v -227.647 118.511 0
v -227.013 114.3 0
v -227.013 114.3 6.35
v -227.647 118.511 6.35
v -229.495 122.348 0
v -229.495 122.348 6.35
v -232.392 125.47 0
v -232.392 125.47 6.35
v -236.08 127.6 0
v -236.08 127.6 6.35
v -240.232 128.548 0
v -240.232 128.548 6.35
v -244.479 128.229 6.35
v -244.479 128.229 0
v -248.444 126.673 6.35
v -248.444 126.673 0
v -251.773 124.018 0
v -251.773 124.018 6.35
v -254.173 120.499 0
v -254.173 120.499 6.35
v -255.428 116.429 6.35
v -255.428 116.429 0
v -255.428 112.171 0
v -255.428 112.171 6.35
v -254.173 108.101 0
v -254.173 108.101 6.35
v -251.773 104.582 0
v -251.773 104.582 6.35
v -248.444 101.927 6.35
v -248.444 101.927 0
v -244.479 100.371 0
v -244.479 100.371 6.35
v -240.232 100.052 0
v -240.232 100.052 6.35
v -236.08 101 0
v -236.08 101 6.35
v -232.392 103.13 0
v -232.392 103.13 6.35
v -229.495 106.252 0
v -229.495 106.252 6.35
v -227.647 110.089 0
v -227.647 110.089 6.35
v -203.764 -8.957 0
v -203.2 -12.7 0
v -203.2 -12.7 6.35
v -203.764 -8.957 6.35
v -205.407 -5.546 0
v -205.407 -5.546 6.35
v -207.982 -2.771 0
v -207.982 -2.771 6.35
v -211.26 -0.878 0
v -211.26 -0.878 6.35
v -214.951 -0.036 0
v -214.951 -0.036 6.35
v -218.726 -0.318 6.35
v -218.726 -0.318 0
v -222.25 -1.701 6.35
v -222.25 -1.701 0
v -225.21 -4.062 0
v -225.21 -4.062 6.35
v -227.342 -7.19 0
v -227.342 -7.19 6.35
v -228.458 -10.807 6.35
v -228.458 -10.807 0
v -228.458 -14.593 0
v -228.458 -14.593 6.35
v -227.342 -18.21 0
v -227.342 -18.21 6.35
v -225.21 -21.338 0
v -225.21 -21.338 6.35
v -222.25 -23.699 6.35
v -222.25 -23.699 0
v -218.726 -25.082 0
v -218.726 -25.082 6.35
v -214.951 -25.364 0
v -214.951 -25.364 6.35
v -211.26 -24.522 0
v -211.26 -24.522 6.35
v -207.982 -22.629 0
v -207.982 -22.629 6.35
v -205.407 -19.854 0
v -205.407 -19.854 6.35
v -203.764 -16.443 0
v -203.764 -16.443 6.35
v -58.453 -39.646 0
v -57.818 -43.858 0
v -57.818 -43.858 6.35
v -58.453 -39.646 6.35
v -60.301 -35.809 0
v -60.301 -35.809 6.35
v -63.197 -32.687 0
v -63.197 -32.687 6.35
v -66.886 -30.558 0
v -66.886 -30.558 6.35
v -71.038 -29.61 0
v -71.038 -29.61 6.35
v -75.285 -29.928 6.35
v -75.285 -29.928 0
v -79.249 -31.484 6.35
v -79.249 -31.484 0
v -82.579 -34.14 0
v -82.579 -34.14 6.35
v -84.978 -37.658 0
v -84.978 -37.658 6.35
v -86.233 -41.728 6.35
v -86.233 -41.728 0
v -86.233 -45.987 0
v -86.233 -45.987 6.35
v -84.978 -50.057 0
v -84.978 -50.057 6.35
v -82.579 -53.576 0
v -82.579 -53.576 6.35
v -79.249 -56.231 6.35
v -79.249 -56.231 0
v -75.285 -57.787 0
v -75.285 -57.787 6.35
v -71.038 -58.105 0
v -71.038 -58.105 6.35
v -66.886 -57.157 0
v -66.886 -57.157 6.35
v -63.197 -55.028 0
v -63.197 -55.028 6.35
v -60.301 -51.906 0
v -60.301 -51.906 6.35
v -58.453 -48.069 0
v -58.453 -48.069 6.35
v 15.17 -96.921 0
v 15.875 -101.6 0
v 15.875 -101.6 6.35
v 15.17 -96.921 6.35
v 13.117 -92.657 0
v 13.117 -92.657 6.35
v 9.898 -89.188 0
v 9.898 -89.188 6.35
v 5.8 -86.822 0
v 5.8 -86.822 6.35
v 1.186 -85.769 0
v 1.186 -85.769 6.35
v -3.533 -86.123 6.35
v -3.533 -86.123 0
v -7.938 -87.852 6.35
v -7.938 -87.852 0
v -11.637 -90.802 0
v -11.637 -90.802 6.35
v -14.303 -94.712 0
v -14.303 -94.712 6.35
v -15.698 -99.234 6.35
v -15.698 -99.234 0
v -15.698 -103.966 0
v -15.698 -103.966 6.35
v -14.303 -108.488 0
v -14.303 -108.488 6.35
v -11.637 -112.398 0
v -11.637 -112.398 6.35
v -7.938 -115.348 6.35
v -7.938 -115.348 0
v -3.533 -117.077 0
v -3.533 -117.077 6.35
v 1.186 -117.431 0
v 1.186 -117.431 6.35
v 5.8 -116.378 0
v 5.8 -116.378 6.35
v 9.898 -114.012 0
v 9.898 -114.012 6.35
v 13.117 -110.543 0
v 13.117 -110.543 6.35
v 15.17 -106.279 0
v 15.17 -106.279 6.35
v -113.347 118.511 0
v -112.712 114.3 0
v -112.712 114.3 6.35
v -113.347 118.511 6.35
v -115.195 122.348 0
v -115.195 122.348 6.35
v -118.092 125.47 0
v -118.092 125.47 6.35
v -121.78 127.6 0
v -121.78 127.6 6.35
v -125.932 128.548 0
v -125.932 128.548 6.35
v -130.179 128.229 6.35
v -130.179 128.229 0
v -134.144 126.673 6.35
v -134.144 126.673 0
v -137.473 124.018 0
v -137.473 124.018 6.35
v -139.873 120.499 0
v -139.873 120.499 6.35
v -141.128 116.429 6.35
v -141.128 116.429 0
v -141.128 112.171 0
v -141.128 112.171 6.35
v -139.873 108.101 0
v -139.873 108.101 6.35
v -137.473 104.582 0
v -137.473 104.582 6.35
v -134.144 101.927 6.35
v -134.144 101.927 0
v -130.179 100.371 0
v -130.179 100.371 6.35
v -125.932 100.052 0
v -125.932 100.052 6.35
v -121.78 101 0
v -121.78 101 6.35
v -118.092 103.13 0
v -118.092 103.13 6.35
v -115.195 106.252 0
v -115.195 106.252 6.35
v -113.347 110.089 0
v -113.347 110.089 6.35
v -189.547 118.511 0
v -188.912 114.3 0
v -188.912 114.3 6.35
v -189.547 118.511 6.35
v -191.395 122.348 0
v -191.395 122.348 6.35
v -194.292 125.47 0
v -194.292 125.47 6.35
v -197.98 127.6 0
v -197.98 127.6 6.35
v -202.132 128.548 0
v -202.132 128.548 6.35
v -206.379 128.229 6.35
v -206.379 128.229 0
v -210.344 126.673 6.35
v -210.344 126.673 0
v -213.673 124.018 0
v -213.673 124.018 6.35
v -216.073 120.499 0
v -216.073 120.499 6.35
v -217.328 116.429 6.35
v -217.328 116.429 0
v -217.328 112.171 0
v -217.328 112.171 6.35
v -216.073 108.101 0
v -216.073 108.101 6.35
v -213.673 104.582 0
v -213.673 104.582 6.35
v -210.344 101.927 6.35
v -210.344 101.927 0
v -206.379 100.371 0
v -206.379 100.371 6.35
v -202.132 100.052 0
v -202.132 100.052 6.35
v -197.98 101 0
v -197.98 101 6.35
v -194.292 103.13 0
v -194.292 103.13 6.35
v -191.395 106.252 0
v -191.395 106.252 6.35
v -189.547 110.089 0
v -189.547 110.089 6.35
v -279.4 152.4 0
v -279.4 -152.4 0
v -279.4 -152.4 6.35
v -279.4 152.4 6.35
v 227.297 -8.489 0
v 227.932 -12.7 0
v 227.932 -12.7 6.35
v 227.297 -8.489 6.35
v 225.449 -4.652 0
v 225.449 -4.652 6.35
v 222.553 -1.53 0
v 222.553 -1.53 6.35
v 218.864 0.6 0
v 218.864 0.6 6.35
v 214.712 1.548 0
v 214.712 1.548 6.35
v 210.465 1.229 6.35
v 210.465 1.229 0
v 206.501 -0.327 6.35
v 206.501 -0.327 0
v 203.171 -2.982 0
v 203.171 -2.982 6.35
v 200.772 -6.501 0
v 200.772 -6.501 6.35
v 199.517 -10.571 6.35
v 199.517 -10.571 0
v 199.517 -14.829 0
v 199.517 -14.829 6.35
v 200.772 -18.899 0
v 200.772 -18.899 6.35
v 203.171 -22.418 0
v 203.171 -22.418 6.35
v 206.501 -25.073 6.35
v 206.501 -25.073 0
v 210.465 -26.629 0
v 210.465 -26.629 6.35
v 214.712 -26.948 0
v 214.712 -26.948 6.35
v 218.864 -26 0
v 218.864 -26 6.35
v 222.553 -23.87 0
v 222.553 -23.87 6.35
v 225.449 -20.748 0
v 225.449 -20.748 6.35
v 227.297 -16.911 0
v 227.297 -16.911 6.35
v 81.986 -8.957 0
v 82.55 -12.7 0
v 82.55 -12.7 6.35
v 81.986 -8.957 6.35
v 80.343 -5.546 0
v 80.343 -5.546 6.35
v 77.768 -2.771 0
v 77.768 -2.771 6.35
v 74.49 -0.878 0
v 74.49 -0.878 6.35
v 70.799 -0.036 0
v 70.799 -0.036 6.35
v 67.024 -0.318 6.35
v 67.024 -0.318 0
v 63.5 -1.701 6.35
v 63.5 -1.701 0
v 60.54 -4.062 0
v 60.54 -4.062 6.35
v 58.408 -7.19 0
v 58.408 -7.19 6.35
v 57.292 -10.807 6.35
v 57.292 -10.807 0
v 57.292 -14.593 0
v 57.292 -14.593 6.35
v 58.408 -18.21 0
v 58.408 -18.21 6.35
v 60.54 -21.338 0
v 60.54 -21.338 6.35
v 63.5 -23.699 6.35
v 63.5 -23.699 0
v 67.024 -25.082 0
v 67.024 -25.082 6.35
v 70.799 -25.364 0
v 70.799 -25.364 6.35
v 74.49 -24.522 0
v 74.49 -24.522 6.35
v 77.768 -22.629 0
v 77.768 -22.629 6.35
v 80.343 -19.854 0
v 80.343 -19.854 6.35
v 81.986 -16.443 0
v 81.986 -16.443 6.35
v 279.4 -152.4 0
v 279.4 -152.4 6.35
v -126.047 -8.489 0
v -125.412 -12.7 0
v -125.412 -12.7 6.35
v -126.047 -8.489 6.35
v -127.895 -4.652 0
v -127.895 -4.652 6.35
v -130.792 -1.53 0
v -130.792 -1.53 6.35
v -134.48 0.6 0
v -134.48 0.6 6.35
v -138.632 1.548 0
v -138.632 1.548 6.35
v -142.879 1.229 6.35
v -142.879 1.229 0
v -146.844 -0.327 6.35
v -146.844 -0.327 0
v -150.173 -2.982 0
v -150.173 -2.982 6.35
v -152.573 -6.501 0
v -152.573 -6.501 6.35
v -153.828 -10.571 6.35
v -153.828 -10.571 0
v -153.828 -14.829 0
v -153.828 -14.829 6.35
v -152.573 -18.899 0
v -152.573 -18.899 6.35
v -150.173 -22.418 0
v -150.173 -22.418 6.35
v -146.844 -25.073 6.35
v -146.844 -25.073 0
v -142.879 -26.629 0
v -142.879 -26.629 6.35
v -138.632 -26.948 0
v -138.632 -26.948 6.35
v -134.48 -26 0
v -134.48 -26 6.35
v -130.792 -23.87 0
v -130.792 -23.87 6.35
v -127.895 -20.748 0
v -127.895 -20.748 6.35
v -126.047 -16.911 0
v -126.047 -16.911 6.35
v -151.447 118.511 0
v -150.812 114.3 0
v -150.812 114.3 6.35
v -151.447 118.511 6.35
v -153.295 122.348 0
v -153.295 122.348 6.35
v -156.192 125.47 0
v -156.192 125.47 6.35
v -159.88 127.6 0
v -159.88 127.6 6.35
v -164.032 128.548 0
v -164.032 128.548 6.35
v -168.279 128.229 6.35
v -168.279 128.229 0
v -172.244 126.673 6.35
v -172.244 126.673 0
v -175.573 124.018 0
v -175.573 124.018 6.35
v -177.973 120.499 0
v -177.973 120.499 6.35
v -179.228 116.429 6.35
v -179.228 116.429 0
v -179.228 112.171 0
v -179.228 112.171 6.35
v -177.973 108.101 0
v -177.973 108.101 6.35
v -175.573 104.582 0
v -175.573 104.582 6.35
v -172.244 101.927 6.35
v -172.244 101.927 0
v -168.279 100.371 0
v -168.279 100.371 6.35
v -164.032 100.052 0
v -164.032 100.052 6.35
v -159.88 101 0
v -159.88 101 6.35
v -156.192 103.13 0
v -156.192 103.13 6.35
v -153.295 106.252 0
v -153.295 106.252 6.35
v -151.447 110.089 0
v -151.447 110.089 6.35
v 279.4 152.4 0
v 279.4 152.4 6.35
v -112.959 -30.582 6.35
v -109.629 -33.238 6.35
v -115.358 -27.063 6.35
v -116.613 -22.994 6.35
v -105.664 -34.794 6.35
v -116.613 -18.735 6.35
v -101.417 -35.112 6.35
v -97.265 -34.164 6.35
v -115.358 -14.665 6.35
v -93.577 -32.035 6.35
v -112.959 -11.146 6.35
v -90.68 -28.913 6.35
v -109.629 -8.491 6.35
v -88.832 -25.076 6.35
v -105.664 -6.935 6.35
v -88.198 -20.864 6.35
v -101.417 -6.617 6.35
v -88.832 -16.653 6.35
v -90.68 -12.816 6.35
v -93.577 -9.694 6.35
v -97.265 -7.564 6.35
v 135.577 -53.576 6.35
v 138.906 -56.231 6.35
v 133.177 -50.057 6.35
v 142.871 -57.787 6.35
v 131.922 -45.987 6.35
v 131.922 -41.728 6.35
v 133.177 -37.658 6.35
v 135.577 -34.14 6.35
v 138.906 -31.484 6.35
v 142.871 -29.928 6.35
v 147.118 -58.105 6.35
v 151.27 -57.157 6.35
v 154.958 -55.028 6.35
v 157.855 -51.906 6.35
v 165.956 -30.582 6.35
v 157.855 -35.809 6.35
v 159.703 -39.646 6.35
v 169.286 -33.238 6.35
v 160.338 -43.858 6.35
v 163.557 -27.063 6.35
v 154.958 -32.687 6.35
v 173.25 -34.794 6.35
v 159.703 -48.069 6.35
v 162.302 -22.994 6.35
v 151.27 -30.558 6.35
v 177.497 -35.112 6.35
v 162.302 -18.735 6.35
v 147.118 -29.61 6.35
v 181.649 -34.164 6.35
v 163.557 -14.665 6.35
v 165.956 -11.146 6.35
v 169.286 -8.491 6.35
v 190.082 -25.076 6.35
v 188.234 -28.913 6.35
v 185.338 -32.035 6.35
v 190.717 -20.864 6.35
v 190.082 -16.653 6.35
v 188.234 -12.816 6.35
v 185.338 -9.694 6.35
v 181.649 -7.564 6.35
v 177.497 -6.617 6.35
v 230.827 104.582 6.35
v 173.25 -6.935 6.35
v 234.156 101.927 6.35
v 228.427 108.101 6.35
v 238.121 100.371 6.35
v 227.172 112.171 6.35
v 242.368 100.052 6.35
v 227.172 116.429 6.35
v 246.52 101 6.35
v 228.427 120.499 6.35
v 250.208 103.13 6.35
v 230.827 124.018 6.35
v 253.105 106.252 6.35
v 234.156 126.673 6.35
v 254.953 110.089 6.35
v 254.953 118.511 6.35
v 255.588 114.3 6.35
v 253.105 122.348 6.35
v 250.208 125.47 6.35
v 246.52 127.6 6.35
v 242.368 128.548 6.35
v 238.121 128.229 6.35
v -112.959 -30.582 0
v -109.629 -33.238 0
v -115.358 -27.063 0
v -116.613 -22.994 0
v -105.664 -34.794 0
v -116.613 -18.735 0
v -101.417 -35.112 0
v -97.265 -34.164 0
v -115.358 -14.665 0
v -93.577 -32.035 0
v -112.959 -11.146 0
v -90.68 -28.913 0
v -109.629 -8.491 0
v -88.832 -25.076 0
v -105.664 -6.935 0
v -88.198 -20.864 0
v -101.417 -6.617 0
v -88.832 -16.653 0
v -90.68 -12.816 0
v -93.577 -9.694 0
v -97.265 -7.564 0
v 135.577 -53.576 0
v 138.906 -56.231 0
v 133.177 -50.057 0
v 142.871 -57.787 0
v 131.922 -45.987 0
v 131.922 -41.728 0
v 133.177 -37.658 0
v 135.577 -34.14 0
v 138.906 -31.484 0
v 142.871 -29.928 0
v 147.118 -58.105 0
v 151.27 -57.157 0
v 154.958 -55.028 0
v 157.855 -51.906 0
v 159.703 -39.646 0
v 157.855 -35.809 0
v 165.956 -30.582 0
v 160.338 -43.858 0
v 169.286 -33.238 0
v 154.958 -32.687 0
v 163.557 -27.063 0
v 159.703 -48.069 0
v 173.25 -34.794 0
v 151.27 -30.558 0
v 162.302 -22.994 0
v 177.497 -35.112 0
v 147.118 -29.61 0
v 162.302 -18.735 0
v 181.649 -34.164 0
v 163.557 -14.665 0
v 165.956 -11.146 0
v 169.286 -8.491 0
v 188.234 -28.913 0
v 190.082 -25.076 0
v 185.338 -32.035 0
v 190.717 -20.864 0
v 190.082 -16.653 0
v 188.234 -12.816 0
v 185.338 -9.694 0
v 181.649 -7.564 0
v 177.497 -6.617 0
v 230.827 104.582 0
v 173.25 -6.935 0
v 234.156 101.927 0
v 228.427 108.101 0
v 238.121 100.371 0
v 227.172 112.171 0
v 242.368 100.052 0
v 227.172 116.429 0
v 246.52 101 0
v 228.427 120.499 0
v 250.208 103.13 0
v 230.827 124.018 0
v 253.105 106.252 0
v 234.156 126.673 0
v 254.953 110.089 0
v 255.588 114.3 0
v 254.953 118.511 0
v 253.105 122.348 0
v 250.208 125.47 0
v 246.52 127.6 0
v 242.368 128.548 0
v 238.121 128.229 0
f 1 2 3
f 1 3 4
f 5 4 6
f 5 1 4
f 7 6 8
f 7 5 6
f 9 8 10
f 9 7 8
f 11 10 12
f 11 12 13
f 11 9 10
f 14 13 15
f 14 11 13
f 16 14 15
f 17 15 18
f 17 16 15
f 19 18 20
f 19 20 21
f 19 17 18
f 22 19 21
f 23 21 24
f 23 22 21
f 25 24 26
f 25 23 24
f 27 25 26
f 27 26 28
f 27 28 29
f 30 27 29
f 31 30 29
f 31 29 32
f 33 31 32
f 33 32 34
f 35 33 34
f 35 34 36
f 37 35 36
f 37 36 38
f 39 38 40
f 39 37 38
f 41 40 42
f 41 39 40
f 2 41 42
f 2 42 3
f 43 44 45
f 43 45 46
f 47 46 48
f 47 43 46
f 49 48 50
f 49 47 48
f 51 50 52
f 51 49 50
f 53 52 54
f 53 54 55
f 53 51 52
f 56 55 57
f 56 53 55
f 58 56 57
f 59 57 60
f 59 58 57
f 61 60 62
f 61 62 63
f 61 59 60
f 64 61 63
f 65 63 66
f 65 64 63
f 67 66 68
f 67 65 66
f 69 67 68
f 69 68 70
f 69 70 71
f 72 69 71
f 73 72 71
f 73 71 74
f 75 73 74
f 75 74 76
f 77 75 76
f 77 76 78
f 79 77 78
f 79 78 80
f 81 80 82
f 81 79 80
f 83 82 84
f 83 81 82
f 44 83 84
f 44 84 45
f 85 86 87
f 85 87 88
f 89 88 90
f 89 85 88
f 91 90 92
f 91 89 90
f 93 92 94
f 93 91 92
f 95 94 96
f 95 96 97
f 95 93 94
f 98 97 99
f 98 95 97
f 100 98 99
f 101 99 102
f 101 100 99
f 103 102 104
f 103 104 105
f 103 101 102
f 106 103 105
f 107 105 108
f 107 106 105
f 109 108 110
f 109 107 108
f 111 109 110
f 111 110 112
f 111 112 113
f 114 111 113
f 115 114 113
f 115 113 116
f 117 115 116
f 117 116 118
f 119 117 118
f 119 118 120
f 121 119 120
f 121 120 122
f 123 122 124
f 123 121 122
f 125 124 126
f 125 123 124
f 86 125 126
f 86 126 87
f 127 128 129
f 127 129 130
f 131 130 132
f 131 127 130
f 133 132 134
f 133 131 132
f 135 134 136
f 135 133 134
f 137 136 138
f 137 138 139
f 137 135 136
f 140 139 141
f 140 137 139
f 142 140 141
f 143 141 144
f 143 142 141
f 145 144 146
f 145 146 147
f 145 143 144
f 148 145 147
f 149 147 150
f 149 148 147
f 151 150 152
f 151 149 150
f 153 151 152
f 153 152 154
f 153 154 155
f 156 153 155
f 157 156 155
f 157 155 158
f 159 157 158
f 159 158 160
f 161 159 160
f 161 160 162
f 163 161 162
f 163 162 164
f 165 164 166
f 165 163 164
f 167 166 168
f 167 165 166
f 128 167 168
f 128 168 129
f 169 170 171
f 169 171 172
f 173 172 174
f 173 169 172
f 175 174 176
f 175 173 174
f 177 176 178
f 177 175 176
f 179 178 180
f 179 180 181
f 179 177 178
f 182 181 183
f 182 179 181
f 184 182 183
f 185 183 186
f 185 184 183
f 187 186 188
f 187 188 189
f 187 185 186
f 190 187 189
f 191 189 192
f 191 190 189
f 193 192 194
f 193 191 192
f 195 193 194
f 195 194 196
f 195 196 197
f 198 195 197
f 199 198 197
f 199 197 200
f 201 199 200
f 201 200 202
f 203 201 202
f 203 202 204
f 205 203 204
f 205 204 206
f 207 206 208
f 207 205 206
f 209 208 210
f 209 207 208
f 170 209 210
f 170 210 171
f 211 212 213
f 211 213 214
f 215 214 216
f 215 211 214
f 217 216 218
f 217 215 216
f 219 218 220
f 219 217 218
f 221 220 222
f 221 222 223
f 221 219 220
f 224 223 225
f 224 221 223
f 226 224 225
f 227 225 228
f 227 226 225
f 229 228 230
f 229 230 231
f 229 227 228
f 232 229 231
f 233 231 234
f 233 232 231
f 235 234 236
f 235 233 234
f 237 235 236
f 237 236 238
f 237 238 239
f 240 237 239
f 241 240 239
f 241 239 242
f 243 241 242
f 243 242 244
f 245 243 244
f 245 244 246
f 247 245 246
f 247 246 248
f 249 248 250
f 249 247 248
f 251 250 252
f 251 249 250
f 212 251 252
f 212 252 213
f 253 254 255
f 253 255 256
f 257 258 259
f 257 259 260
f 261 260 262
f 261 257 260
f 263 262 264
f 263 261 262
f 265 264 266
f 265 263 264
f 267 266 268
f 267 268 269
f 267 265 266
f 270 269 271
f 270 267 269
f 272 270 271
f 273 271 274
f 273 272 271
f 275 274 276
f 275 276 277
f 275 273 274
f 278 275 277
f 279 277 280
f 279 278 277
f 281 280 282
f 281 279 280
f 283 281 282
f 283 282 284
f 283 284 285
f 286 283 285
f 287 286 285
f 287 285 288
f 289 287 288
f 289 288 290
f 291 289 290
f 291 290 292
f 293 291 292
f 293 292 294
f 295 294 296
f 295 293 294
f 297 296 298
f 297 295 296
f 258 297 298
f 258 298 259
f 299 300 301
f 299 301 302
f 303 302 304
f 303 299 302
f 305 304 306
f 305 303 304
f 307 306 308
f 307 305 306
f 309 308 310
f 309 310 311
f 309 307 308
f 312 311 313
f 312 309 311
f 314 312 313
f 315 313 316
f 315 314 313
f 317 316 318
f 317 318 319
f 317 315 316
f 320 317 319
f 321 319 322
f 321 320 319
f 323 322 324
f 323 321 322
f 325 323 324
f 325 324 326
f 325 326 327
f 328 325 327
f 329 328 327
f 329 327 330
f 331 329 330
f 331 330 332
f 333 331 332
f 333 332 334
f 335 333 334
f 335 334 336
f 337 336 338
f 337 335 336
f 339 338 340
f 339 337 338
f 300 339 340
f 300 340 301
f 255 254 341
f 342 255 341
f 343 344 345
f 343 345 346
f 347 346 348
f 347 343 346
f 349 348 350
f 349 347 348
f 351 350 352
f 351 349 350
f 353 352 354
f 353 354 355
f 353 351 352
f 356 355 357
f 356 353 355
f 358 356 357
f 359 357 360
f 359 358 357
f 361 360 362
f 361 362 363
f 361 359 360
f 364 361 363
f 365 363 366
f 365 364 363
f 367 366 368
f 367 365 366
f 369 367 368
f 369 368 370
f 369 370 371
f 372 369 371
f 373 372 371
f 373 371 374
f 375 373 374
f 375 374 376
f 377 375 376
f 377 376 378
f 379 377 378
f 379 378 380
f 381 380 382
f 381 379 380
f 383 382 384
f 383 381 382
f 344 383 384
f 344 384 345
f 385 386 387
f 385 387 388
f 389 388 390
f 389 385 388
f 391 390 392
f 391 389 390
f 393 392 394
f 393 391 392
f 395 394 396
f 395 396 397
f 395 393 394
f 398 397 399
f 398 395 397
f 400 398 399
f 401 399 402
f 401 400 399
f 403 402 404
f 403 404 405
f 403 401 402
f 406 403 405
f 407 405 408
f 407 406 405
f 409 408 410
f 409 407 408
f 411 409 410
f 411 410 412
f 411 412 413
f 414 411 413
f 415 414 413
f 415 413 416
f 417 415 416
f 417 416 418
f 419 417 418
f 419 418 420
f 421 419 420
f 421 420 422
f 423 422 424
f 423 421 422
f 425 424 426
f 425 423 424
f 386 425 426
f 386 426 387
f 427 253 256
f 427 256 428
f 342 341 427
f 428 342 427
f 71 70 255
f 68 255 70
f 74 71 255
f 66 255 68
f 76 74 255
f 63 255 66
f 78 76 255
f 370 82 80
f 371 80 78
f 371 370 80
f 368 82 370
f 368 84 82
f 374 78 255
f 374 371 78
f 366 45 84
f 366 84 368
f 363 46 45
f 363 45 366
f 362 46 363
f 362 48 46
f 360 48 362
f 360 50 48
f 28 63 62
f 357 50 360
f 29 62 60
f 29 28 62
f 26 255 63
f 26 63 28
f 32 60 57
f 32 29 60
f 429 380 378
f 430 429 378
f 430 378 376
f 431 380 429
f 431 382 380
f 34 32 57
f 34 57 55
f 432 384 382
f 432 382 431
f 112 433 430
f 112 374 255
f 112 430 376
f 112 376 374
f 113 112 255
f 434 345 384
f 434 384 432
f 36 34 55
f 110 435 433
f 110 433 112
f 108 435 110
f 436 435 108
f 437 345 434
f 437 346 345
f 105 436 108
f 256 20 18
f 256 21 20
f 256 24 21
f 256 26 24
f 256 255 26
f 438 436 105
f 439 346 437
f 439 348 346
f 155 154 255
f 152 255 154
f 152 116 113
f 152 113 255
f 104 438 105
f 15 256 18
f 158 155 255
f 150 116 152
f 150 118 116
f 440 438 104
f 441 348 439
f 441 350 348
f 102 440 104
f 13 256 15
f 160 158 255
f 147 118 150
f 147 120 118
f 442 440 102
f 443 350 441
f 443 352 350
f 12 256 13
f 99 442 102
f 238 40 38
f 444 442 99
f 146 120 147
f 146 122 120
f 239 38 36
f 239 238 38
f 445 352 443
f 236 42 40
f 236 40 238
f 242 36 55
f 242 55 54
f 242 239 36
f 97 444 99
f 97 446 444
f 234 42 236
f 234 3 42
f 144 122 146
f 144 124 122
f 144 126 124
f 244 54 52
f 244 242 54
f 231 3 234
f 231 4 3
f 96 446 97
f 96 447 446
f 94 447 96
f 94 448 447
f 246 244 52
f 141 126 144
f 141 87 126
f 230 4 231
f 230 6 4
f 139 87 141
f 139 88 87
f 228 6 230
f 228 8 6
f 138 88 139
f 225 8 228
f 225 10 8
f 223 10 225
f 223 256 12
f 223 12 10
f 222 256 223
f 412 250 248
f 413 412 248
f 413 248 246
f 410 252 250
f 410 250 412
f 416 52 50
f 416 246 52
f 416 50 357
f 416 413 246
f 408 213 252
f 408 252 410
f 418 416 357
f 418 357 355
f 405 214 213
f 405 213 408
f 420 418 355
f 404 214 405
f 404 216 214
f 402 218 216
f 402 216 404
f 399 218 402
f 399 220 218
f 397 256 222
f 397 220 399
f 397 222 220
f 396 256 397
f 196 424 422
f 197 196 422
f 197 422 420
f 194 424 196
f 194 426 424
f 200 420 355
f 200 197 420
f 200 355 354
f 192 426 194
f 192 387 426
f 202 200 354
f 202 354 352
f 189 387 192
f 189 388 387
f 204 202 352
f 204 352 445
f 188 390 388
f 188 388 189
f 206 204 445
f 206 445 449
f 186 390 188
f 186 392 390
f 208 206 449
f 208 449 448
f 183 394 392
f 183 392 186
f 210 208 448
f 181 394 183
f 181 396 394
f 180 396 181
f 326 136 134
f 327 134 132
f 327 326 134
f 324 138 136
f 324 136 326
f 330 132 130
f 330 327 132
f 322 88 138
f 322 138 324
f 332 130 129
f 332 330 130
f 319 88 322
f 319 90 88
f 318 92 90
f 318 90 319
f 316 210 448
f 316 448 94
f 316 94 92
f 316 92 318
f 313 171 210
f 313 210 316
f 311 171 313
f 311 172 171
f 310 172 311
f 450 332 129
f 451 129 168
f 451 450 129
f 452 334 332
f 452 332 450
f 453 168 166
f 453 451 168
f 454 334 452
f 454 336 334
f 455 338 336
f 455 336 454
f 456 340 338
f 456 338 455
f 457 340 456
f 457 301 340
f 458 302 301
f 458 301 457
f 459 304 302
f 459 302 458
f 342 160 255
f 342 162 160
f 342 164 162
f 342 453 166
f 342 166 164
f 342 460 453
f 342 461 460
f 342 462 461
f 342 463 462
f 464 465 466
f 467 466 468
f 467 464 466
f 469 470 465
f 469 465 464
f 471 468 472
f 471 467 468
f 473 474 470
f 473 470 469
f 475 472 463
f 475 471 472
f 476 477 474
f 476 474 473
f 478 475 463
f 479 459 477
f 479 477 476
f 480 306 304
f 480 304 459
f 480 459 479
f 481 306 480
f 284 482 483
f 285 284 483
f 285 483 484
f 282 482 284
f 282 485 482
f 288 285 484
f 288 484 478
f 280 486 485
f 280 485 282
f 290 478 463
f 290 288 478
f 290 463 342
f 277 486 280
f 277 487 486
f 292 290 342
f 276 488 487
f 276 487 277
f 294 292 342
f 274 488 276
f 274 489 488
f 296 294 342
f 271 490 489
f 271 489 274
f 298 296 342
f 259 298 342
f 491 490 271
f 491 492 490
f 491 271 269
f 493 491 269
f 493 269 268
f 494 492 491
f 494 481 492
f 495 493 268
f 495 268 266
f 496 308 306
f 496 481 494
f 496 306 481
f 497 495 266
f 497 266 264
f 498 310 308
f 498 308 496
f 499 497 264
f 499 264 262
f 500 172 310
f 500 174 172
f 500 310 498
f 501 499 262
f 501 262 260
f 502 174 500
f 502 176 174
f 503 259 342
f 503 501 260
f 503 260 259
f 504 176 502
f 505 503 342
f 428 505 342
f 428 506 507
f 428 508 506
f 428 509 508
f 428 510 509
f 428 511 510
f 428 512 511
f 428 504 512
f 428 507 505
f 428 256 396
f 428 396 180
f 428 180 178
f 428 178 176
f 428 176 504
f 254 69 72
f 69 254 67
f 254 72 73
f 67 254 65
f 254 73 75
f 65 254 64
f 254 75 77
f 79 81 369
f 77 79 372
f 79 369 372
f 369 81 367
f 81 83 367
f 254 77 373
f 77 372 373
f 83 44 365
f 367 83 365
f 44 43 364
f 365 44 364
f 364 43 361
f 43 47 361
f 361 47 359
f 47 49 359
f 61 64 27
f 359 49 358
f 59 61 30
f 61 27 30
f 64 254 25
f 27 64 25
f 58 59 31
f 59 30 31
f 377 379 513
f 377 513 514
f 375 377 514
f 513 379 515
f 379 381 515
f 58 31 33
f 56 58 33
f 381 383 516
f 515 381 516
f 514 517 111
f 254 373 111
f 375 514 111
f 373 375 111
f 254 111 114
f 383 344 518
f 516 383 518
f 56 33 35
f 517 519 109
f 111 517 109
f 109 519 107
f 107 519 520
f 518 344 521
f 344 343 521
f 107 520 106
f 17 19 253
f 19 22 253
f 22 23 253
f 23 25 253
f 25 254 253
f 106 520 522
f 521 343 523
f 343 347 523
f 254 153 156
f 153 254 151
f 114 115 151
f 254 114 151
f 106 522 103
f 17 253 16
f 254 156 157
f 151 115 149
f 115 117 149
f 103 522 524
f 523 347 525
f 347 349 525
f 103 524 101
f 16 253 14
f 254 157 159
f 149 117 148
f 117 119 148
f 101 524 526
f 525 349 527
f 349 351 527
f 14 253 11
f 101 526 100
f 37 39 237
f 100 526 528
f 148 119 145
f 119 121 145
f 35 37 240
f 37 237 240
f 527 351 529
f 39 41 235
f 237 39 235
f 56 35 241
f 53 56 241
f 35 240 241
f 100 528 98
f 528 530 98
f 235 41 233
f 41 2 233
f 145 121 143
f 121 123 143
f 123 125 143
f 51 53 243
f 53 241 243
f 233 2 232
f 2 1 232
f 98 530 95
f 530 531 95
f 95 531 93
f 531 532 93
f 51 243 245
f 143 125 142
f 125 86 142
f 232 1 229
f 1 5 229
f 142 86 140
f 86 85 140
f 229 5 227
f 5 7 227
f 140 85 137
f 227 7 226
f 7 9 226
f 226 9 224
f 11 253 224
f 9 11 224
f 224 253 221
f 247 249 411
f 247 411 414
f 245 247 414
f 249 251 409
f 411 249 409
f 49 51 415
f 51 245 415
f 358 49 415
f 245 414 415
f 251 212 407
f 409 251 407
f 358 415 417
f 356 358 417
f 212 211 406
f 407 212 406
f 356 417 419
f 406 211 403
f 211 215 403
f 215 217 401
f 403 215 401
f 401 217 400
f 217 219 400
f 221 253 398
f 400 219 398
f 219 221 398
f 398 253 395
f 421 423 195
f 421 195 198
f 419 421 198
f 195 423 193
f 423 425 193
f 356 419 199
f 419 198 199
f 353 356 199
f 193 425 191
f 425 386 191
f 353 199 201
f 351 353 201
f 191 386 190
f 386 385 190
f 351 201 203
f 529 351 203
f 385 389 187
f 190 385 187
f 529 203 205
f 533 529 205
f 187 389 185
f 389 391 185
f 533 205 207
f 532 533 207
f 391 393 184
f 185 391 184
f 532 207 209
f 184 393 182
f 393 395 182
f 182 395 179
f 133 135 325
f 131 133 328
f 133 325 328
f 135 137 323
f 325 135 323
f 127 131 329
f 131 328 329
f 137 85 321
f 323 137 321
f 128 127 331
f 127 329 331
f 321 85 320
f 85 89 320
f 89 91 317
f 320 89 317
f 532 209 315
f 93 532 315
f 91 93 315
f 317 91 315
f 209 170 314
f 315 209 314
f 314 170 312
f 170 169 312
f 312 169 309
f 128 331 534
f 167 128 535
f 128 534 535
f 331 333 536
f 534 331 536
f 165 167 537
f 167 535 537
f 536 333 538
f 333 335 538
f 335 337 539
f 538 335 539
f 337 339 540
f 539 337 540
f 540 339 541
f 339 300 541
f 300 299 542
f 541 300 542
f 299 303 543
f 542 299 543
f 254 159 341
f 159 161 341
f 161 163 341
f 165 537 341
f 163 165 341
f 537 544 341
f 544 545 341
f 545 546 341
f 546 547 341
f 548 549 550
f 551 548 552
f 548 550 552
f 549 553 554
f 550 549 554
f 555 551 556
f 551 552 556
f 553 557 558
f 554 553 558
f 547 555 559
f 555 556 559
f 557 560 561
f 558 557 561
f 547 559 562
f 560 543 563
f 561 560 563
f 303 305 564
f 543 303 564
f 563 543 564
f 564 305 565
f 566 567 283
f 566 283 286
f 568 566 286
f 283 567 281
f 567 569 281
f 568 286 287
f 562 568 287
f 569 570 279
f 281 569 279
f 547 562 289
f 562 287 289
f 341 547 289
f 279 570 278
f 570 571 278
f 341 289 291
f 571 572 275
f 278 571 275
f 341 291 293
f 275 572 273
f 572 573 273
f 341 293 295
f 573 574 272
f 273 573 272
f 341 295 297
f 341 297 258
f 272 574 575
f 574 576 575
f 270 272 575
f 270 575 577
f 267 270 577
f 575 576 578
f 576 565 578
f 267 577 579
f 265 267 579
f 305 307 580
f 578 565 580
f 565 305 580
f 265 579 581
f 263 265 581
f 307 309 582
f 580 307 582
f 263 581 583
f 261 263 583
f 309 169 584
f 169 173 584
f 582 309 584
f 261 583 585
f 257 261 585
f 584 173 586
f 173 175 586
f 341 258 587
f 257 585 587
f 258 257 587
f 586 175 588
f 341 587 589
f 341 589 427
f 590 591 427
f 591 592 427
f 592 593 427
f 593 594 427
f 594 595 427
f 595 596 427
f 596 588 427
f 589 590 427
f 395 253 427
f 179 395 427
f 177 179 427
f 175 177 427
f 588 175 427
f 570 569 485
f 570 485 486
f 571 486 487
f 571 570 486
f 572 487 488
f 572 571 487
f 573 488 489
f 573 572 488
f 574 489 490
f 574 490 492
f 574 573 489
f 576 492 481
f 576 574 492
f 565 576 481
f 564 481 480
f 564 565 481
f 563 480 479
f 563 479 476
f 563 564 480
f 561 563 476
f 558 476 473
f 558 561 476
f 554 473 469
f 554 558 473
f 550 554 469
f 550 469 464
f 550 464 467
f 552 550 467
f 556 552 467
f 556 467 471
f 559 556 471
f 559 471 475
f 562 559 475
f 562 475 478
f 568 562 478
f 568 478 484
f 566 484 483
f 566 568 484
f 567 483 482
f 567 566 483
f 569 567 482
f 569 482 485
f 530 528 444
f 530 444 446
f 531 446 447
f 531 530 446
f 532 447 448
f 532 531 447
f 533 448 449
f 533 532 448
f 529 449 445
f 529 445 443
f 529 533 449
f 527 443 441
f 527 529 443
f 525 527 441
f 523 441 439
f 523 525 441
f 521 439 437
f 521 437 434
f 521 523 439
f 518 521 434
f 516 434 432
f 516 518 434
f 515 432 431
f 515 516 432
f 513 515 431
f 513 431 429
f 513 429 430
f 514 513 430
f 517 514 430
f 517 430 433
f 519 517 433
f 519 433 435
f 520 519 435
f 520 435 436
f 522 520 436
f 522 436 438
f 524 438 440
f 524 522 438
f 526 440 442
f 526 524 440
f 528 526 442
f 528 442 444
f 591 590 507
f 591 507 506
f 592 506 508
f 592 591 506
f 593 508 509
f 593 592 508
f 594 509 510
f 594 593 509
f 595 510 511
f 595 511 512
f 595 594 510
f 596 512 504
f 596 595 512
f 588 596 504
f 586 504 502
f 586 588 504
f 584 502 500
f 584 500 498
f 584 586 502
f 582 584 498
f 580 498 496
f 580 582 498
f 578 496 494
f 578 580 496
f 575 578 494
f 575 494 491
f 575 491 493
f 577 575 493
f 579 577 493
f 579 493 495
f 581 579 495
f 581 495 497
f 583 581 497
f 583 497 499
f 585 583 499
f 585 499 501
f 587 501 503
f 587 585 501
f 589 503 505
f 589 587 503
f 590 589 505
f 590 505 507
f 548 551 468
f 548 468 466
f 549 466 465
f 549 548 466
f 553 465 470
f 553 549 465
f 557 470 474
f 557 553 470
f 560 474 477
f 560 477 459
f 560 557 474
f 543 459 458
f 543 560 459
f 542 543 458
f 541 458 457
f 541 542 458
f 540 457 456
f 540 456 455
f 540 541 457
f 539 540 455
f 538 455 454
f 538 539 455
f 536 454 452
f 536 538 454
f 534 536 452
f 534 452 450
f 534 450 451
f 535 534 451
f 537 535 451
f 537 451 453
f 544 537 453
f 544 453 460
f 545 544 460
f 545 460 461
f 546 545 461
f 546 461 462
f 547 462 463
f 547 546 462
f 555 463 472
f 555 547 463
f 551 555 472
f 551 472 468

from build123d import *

# Parameters (mm, degrees)
SKETCH_W   = 558.8
SKETCH_H   = 304.8
SKETCH_R   = 14.2875
SKETCH_R_2 = 15.875
SKETCH_R_3 = 12.7
PAD_DEPTH  = 6.35


with BuildPart() as part:
    # Sketch → Pad (new body)
    with BuildSketch(Plane.XY):
        Rectangle(SKETCH_W, SKETCH_H)
        with Locations((-241.3, 114.3)):
            Circle(SKETCH_R, mode=Mode.SUBTRACT)
        with Locations((-203.2, 114.3)):
            Circle(SKETCH_R, mode=Mode.SUBTRACT)
        with Locations((-127, 114.3)):
            Circle(SKETCH_R, mode=Mode.SUBTRACT)
        with Locations((-165.1, 114.3)):
            Circle(SKETCH_R, mode=Mode.SUBTRACT)
        with Locations((241.3, 114.3)):
            Circle(SKETCH_R, mode=Mode.SUBTRACT)
        with Locations((0, -101.6)):
            Circle(SKETCH_R_2, mode=Mode.SUBTRACT)
        with Locations((-215.9, -12.7)):
            Circle(SKETCH_R_3, mode=Mode.SUBTRACT)
        with Locations((69.85, -12.7)):
            Circle(SKETCH_R_3, mode=Mode.SUBTRACT)
        with Locations((-139.7, -12.7)):
            Circle(SKETCH_R, mode=Mode.SUBTRACT)
        with Locations((-102.485024, -20.864286)):
            Circle(SKETCH_R, mode=Mode.SUBTRACT)
        with Locations((-72.105452, -43.85758)):
            Circle(SKETCH_R, mode=Mode.SUBTRACT)
        with Locations((146.05, -43.85758)):
            Circle(SKETCH_R, mode=Mode.SUBTRACT)
        with Locations((176.429572, -20.864286)):
            Circle(SKETCH_R, mode=Mode.SUBTRACT)
        with Locations((213.644548, -12.7)):
            Circle(SKETCH_R, mode=Mode.SUBTRACT)
    extrude(amount=PAD_DEPTH)


solid = part.part
